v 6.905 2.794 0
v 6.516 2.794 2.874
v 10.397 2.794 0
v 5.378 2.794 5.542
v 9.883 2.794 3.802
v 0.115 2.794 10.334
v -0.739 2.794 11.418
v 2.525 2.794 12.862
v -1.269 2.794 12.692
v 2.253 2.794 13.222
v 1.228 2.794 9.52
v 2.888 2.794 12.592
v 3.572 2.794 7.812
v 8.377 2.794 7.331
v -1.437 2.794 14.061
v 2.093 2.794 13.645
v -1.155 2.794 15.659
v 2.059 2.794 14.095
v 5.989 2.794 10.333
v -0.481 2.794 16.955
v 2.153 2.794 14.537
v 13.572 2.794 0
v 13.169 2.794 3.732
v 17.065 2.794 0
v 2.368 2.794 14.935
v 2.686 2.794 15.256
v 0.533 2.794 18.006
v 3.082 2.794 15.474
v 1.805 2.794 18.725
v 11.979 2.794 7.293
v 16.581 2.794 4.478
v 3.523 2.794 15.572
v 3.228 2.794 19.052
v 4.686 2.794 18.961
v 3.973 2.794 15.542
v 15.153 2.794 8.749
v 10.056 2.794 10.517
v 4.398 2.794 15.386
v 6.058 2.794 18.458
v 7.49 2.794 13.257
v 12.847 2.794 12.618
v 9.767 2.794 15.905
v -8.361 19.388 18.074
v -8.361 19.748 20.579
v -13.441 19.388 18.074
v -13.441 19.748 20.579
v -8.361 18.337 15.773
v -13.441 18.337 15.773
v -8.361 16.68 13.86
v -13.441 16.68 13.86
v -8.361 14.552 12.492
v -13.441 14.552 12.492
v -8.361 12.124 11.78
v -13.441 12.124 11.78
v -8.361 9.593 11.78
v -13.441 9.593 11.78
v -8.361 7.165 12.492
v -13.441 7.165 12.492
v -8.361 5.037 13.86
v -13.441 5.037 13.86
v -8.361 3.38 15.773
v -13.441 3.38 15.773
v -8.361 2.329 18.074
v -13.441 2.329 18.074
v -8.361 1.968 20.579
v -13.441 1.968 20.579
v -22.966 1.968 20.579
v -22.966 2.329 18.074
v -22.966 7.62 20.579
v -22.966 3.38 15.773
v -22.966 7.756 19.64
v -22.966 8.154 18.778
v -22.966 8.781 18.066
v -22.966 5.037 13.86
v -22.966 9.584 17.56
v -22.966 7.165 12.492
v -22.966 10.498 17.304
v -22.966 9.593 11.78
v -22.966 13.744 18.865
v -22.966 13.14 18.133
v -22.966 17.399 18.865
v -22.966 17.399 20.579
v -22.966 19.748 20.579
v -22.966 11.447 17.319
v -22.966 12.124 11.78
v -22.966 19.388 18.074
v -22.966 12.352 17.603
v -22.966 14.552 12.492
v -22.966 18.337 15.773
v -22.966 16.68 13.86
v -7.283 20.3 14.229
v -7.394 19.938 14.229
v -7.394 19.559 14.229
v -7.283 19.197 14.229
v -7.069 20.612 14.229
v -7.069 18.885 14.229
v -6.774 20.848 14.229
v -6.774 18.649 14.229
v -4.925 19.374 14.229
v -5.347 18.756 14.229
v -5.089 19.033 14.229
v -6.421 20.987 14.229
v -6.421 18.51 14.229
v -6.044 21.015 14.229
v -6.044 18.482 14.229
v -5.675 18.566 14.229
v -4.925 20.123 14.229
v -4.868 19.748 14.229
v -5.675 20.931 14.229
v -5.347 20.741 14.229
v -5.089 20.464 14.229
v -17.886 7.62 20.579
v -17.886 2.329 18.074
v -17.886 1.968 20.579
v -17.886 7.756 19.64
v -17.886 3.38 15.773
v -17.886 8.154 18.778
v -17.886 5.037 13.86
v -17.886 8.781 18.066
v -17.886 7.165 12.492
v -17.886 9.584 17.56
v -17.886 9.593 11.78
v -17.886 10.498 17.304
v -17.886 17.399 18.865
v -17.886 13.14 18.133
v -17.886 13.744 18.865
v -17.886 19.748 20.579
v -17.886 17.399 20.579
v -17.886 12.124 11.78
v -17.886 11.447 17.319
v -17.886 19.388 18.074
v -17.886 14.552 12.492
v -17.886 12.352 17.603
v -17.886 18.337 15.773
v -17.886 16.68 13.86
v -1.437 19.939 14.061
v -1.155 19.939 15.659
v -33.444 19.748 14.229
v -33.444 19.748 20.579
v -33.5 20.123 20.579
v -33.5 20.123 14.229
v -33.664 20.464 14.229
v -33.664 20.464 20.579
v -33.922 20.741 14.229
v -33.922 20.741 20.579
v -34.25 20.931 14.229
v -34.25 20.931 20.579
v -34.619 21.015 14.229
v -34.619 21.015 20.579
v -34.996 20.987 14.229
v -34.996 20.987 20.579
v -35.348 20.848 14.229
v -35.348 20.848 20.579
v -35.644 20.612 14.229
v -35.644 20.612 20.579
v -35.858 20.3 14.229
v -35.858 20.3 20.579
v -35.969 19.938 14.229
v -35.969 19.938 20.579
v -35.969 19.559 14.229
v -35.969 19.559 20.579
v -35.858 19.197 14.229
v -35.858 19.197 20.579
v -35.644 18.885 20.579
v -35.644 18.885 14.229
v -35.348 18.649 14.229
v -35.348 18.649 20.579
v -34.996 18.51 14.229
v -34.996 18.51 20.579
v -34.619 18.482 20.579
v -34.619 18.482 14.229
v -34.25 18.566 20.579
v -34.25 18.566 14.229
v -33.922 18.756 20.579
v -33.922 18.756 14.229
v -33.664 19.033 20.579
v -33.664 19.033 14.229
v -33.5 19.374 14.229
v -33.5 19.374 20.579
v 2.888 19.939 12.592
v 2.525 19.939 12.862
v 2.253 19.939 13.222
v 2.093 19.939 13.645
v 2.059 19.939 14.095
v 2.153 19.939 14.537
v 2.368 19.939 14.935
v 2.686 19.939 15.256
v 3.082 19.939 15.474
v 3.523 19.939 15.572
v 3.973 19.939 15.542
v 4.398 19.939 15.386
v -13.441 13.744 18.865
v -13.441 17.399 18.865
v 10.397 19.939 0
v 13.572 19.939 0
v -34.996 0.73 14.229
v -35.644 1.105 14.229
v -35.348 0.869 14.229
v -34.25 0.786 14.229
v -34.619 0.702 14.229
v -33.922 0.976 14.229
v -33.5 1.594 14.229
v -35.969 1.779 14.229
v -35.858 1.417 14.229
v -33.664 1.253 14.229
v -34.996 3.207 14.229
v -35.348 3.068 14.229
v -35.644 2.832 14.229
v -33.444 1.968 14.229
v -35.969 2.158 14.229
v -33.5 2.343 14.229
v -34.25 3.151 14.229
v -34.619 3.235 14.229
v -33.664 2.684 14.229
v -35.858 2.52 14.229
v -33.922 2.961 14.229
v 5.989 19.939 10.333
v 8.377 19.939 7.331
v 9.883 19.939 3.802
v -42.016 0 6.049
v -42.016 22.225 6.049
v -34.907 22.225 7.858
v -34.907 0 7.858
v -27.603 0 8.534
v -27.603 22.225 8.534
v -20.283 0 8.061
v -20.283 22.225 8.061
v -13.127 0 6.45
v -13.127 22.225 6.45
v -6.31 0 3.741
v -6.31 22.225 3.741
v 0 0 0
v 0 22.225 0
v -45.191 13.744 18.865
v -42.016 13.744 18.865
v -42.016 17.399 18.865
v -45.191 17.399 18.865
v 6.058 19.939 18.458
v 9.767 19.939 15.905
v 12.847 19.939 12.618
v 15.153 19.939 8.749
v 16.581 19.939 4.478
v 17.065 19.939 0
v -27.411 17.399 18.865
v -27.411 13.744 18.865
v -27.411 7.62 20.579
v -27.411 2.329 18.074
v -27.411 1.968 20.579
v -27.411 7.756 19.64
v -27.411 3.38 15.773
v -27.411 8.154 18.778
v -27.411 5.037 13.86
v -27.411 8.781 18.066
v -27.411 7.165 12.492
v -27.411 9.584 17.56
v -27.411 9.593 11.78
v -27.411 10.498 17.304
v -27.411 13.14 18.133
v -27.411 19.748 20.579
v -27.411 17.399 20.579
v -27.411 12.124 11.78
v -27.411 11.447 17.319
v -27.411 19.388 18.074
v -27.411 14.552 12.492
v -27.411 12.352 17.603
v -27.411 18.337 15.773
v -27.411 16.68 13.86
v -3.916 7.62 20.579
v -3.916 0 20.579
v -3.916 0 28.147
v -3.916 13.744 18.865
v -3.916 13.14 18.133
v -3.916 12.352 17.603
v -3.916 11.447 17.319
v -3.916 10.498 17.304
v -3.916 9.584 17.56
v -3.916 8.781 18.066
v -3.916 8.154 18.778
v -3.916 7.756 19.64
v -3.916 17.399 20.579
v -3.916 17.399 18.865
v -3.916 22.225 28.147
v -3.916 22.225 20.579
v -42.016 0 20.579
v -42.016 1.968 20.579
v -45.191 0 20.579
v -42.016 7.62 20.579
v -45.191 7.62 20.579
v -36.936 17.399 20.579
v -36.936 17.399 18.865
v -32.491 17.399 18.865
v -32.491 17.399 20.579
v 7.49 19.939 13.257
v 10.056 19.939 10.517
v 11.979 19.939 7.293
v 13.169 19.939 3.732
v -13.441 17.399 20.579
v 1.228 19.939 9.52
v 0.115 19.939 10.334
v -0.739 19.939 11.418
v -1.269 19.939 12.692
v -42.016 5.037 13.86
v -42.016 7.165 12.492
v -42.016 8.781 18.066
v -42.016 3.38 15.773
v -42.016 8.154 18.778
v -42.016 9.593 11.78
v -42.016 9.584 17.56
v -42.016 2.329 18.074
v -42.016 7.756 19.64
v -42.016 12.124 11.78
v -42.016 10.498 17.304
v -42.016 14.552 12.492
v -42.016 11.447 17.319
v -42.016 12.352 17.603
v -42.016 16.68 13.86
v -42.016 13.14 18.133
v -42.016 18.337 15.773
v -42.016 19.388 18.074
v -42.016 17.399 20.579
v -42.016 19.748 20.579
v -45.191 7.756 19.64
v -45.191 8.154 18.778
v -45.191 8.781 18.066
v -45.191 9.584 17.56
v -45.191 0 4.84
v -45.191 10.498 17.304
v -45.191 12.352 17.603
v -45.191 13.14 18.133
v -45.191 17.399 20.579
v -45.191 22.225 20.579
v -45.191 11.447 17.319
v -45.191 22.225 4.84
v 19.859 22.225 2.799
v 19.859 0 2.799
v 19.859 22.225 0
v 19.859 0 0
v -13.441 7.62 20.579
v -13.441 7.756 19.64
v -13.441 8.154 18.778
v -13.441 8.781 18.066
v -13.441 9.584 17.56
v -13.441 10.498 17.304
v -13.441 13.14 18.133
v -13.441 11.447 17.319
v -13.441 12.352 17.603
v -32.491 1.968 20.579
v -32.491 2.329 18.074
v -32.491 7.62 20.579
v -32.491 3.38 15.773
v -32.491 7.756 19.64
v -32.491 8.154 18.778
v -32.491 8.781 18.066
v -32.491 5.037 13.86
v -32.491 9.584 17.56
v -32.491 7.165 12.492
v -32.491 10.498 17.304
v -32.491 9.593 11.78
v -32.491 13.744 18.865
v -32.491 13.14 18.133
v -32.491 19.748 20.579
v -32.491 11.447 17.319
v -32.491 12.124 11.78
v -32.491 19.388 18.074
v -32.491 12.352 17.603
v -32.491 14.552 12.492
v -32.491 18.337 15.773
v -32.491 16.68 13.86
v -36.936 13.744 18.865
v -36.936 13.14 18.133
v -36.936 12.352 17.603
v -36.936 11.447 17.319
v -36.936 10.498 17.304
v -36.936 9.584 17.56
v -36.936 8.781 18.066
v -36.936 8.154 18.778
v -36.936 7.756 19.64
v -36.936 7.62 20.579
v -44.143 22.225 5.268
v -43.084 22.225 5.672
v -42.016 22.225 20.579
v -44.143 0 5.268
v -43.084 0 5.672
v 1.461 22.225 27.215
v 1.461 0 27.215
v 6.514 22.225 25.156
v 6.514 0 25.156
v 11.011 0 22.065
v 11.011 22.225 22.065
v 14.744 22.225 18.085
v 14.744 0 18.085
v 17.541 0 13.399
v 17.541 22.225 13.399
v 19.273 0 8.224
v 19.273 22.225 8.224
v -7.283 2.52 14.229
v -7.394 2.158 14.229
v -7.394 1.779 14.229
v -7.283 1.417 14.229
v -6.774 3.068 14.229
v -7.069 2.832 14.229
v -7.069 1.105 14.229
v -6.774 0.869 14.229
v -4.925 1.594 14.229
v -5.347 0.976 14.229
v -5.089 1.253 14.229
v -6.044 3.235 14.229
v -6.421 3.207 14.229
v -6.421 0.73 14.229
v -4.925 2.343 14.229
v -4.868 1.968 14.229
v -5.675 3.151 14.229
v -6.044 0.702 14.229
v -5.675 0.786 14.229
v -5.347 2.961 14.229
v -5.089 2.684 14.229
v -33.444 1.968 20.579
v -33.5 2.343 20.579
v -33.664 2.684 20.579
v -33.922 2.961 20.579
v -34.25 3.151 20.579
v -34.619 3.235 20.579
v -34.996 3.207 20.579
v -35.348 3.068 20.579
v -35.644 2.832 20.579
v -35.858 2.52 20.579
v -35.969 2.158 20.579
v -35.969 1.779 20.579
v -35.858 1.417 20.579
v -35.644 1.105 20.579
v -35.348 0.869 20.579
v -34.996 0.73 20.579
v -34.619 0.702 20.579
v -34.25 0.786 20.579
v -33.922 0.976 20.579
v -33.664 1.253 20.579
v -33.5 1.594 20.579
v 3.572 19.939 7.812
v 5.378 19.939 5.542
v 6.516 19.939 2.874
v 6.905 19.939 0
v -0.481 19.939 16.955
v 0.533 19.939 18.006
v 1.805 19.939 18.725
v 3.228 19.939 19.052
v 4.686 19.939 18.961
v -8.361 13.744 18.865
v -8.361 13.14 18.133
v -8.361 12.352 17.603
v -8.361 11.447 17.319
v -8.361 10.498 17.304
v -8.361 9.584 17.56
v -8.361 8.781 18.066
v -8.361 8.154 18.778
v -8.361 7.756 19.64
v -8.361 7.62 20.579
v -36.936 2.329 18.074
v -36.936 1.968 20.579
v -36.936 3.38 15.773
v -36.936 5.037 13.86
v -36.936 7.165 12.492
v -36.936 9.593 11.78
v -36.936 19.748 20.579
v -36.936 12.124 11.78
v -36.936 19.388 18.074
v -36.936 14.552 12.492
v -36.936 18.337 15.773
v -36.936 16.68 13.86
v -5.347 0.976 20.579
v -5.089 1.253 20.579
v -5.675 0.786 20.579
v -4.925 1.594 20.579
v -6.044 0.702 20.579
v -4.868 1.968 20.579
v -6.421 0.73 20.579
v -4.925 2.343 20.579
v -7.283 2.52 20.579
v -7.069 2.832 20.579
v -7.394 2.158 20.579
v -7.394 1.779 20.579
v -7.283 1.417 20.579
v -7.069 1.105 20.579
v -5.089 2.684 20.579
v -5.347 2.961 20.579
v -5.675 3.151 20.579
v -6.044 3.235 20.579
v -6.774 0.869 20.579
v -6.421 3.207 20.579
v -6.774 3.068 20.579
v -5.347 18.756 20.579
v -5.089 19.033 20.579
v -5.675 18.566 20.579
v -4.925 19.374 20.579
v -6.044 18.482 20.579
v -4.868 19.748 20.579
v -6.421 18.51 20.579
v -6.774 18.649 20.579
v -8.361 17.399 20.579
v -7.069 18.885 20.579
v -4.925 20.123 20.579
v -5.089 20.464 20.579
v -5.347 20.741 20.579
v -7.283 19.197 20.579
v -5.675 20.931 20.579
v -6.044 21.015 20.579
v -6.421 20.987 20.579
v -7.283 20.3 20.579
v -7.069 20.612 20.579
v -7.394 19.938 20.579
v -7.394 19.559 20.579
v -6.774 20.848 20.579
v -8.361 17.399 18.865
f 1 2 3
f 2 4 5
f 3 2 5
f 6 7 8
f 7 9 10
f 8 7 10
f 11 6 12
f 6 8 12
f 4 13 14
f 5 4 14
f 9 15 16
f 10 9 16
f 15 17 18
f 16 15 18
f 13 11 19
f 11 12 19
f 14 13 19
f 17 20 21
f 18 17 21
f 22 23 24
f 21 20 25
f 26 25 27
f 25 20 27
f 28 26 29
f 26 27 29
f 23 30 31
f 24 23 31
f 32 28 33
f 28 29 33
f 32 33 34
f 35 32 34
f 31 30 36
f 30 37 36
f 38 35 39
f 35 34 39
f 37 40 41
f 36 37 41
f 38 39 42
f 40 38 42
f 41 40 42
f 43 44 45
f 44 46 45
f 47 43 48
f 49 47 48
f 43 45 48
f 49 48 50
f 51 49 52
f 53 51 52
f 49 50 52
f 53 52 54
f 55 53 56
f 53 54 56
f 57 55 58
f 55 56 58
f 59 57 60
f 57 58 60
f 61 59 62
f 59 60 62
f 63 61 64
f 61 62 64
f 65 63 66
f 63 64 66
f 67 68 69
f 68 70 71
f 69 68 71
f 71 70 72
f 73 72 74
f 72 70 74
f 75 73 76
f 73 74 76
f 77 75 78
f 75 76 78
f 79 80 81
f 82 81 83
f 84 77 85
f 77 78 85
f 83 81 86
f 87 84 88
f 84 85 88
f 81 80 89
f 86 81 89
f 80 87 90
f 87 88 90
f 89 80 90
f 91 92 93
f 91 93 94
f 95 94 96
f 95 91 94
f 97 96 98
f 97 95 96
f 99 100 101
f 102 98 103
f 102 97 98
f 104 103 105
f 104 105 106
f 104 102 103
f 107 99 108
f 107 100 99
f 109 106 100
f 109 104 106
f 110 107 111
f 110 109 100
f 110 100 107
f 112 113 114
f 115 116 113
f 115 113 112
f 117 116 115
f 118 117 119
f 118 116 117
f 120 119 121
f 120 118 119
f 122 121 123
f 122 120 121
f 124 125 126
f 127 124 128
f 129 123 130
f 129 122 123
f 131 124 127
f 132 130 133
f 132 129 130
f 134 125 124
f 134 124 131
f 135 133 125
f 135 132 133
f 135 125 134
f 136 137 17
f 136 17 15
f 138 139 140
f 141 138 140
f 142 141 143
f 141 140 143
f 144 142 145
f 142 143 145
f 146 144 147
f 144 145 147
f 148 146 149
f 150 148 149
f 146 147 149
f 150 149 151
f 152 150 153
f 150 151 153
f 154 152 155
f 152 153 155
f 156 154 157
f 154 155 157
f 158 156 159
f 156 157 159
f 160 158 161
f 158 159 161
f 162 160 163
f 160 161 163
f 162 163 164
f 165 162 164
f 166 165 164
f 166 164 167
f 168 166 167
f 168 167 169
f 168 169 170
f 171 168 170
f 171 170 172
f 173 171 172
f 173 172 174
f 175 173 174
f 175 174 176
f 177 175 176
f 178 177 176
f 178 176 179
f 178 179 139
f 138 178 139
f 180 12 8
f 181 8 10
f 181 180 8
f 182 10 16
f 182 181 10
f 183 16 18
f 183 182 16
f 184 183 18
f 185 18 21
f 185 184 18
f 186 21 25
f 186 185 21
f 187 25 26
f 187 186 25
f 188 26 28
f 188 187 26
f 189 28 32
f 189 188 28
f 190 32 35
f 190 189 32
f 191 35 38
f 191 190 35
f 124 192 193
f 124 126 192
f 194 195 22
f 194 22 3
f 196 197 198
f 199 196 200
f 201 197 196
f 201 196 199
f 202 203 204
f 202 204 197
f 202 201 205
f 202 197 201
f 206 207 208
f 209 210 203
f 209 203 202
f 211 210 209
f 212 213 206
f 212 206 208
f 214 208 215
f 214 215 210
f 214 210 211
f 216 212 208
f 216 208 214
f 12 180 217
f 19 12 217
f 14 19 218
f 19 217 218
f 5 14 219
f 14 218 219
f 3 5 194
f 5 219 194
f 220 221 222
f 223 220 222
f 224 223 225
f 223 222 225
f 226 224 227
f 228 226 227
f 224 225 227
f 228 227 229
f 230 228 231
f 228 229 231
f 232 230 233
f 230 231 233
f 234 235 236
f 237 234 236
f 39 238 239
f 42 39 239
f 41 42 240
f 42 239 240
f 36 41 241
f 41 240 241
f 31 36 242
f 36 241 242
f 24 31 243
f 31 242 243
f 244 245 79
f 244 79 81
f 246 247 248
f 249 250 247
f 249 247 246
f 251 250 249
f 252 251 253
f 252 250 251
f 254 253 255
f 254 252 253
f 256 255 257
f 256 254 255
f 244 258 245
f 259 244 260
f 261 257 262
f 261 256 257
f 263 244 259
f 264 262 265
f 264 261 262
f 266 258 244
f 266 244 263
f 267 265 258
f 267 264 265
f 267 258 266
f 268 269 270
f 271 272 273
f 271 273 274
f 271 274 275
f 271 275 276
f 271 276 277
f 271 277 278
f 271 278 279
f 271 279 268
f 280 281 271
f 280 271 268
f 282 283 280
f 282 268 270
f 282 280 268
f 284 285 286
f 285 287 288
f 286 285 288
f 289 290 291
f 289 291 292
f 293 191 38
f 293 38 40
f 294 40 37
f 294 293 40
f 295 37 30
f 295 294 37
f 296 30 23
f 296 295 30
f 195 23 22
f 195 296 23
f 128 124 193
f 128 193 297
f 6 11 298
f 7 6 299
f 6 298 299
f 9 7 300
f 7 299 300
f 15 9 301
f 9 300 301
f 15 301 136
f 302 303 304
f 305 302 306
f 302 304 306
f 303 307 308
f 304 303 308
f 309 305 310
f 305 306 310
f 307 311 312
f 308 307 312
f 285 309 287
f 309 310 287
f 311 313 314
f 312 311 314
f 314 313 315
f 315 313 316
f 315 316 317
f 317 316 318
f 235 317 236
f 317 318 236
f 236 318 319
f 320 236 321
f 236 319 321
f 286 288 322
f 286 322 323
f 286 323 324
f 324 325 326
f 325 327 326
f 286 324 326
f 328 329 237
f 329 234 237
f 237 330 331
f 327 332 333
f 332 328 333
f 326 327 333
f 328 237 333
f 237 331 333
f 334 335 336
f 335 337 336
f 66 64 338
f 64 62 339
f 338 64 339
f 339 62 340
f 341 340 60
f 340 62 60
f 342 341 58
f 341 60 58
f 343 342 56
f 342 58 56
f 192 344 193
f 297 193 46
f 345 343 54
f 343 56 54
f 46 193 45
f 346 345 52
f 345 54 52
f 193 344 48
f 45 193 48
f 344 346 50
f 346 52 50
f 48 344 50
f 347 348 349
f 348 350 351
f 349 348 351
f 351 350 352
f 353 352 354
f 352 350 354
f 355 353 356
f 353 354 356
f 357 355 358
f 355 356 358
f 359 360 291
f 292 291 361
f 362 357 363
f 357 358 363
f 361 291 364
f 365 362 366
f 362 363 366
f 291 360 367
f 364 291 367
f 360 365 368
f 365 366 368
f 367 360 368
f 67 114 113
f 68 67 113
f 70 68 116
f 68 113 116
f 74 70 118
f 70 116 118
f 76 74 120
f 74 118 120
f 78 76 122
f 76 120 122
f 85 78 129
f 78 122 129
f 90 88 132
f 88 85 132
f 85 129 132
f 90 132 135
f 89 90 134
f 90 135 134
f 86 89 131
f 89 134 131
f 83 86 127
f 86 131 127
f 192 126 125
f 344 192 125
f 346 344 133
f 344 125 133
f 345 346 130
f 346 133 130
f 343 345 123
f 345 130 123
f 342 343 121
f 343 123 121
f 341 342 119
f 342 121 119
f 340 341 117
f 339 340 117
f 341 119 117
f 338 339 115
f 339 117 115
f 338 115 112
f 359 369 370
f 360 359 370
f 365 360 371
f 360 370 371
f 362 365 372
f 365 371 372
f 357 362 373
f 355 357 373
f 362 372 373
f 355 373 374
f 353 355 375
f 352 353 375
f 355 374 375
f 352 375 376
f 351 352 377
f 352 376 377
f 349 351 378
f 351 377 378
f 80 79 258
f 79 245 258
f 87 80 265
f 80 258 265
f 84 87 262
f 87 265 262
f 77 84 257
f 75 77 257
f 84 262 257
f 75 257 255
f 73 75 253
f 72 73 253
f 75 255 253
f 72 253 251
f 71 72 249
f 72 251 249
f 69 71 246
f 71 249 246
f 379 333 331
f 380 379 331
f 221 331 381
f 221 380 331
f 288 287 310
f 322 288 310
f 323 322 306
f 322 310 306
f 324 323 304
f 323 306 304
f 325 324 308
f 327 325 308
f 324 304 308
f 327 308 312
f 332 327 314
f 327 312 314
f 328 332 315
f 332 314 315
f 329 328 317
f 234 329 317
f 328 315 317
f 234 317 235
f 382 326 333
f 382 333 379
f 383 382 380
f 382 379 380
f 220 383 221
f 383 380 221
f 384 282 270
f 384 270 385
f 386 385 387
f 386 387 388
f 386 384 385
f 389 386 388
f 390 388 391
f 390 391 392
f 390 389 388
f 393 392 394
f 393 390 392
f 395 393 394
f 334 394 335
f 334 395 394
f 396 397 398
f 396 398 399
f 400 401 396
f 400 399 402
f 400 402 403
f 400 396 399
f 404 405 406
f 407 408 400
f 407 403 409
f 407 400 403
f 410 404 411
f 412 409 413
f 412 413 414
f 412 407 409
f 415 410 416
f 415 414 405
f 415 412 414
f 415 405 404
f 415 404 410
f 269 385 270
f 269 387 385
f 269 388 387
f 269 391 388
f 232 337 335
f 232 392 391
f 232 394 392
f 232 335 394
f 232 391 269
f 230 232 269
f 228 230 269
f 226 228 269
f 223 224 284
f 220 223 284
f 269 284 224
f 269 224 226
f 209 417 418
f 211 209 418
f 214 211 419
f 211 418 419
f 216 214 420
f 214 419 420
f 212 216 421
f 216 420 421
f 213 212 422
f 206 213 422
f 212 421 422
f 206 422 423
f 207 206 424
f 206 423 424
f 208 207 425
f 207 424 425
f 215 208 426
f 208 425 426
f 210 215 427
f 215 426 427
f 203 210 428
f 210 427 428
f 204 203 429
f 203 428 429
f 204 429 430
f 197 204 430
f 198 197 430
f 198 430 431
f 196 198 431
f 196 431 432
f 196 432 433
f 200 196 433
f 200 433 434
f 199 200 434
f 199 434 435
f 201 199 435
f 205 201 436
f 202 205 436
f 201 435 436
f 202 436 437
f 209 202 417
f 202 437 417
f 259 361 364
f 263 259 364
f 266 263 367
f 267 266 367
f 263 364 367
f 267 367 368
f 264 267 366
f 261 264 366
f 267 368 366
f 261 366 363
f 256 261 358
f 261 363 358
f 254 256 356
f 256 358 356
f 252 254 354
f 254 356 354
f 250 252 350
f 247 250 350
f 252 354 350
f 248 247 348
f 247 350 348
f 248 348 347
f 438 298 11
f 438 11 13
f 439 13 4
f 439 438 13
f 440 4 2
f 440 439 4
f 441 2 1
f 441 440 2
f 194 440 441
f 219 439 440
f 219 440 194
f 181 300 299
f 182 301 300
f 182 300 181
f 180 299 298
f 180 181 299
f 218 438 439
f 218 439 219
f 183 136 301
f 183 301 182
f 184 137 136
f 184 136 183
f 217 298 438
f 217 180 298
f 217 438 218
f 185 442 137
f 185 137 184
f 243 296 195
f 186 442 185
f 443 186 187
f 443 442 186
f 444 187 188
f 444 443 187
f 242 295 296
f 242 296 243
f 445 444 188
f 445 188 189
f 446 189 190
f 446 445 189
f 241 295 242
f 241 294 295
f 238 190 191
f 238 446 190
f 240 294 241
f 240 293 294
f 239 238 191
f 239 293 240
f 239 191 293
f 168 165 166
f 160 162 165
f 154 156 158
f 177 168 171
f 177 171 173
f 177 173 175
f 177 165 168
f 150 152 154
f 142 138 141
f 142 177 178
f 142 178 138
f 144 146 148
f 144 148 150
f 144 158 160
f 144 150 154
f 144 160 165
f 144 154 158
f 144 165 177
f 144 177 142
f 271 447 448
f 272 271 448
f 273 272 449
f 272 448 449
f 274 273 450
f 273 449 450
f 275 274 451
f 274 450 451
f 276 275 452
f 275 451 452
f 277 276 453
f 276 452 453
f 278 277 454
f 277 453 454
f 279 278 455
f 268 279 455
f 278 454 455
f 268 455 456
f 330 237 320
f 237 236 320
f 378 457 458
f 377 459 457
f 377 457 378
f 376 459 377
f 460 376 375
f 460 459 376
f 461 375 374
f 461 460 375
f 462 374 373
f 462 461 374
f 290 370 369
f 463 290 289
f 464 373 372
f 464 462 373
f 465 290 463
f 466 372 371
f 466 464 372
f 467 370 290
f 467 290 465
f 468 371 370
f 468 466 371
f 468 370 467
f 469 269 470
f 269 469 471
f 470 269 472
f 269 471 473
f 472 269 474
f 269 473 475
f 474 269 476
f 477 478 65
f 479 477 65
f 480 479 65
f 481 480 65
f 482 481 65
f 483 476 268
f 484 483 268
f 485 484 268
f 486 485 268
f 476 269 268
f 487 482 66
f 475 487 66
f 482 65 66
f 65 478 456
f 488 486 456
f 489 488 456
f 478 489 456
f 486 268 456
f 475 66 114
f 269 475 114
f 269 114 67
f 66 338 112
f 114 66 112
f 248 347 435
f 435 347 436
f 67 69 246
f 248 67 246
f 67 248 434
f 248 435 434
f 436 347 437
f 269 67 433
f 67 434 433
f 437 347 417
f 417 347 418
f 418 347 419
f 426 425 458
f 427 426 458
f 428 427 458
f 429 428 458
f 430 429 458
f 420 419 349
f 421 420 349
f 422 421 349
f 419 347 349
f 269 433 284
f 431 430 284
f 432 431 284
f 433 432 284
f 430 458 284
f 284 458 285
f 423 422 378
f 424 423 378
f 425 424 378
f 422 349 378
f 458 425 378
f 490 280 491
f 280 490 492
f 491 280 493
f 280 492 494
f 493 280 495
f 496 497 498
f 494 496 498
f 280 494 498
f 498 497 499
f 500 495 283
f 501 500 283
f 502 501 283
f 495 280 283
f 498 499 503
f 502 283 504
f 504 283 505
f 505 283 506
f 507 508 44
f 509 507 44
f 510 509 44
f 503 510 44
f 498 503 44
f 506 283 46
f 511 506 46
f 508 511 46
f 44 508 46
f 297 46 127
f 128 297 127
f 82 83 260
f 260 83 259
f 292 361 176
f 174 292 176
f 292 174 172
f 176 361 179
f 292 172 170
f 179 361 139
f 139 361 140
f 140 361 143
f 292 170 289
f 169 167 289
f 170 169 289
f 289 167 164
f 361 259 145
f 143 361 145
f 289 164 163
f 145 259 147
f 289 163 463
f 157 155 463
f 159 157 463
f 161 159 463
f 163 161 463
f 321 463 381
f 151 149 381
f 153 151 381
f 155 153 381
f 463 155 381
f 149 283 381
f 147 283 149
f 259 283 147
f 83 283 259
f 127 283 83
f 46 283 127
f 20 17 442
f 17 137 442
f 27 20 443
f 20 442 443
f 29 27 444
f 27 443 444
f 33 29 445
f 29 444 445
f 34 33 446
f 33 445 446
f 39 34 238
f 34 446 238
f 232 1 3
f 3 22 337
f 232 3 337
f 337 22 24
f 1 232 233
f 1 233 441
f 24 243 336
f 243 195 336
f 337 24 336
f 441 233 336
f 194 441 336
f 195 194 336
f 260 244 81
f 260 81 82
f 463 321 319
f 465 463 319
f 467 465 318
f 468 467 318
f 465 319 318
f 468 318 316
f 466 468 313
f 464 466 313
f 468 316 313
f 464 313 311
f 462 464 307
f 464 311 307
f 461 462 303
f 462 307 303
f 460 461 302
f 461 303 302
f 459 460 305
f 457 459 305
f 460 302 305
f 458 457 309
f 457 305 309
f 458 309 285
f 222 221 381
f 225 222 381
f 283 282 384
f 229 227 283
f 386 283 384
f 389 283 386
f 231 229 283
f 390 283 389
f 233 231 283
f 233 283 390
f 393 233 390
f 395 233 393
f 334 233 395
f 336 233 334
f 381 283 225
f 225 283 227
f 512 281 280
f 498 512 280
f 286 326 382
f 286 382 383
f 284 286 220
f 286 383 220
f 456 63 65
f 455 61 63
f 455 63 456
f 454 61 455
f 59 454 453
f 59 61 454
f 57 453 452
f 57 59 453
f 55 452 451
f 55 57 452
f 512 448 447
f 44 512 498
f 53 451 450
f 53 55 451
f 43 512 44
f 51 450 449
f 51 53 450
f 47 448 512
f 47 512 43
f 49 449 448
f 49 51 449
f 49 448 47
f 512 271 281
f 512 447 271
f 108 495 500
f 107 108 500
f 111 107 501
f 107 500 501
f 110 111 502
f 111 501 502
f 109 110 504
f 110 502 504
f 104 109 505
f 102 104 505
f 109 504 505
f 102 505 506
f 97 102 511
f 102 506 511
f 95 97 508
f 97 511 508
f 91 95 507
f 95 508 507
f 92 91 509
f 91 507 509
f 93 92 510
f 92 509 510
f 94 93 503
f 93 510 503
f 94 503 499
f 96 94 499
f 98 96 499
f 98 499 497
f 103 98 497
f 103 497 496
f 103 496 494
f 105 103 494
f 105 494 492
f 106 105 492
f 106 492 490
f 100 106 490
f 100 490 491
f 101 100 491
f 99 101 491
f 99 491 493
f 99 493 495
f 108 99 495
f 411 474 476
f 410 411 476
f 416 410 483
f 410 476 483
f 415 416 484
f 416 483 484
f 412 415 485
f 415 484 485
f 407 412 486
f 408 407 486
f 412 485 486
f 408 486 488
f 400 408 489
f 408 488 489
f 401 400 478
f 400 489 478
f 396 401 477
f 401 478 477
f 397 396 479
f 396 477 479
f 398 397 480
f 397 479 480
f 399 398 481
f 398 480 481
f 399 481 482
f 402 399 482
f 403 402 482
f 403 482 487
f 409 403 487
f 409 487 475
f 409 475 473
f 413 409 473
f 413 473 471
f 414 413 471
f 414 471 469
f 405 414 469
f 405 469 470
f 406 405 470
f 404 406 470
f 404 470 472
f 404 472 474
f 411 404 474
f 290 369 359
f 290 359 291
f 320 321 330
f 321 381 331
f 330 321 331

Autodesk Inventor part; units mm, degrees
ref_plane "YZ Plane" through (0, 0, 0) normal (1, 0, 0) x (0, 1, 0)
ref_plane "XZ Plane" through (0, 0, 0) normal (0, 1, 0) x (-1, 0, 0)
sketch "Sketch1" plane through (0, 0, 0) normal (0, 0, 1) x (1, 0, 0)
  circle A0 centre (12.2387, 16.51) radius 2.54 projected
  line L0 (19.8587, 0) -> (0, 0) projected
  line L1 (19.8587, 0) -> (19.8587, 22.225) projected
  line L2 (0, 22.225) -> (19.8587, 22.225) projected
  line L3 (0, 0) -> (0, 22.225) projected
  line L4 (-42.016, 22.225) -> (-42.016, 0) projected
  line L5 (-42.016, 22.225) -> (19.8587, 22.225)
  line L6 (19.8587, 22.225) -> (19.8587, 0)
  line L7 (19.8587, 0) -> (-42.016, 0)
  line L8 (-42.016, 0) -> (-42.016, 22.225)
ref_plane "Work Plane1" through (-48.366, 22.225, 28.1991) normal (0, 0, 1) x (1, 0, 0)
extrude "Extrusion1" add sketch "Sketch1" along normal up to surface (28.1991 mm away) contours A0 | L0 L3 L2 L1 | L7 L4 L5 L3
sketch "Sketch6" plane through (-42.016, 22.225, 0) normal (0, 1, 0) x (1, 0, 0)
  arc A0 (36.4747, -28.1991) -> (61.8747, -2.7991) centre (36.4747, -2.7991) ccw projected
  arc A1 (-11.8913, 0) -> (42.016, 0) centre (15.0623, 38.2739) ccw projected
  line L0 (0, -17.4041) -> (38.1, -17.4041)
  line L1 (0, 0) -> (0, -28.1991) projected
  line L2 (0, -6.049) -> (0, 0)
  line L3 (0, 0) -> (42.016, 0)
  line L4 (61.8747, 0) -> (61.8747, -28.1991) projected
  line L5 (61.8747, -2.7991) -> (61.8747, -28.1991)
  line L6 (61.8747, -28.1991) -> (36.4747, -28.1991)
  line L7 (38.1, -17.4041) -> (38.1, -28.147)
  line L8 (0, -17.4041) -> (0, -6.049)
  line L9 (61.8747, -28.1991) -> (0, -28.1991) projected
  line L10 (38.1, -28.1991) -> (36.4747, -28.1991)
  line L11 (38.1, -17.4041) -> (0, -17.4041)
  line L12 (0, -17.4041) -> (0, -28.1991)
  line L13 (0, -28.1991) -> (38.1, -28.1991)
  line L14 (38.1, -28.1991) -> (38.1, -17.4041)
  line L15 (0, -23.7541) -> (38.1, -23.7541)
  line L16 (0, -28.1991) -> (38.9215, -28.2018)
  line L17 (38.9215, -28.2018) -> (38.9212, -28.1991)
  line L18 (36.4747, -20.5791) -> (38.1, -20.5791)
  line L19 (36.4747, -20.5791) -> (0, -20.5791)
extrude "Extrusion6" cut sketch "Sketch6" against normal through all contours L9 L1 L15 L7 A0 | A0 L14 L6 | L6 L17 L16 L9 | L1 L3 A1 | A0 L4 L6 L14 | L15 L1 L19 L18 L7
sketch "Sketch7" plane through (-42.016, 0, 6.049) normal (-1, 0, 0) x (0, 0, 1)
  line L0 (16.1176, 18.669) -> (12.9426, 18.669) projected
  circle A0 centre (14.5301, 10.922) radius 3.175 projected
  arc A1 (12.8156, 13.744) -> (16.2446, 13.744) centre (14.5301, 10.922) ccw
  line L1 (16.2446, 18.796) -> (16.2446, 10.795)
  line L2 (16.2446, 10.795) -> (12.8156, 10.795)
  line L3 (12.8156, 10.795) -> (12.8156, 18.796)
  line L4 (12.8156, 17.399) -> (16.2446, 17.399)
  point P0 (-6.049, 0)
  dimension "d31" = 6.604
  dimension "d35" = 6.477
extrude "Extrusion7" cut sketch "Sketch7" against normal blind 38.1
sketch "Sketch8" plane through (-42.016, 0, 20.5791) normal (0, 0, 1) x (1, 0, 0)
  line L0 (0, 14.097) -> (33.655, 14.097)
  line L1 (38.1, 7.62) -> (0, 7.62) projected
  line L2 (0, 14.097) -> (0, 7.62)
  line L3 (0, 13.744) -> (38.1, 13.744) projected
  line L4 (0, 22.225) -> (0, 0) projected
  line L5 (38.1, 10.8585) -> (0, 10.8585)
  line L6 (9.525, 13.6716) -> (5.08, 13.6716) projected
  line L7 (9.525, 13.6716) -> (9.525, 17.272) projected
  line L8 (9.525, 17.272) -> (5.08, 17.272) projected
  line L9 (5.08, 17.272) -> (5.08, 13.6716) projected
  line L10 (19.05, 13.6716) -> (14.605, 13.6716) projected
  line L11 (19.05, 13.6716) -> (19.05, 17.272) projected
  line L12 (19.05, 17.272) -> (14.605, 17.272) projected
  line L13 (14.605, 17.272) -> (14.605, 13.6716) projected
  line L14 (28.575, 13.6716) -> (24.13, 13.6716) projected
  line L15 (28.575, 13.6716) -> (28.575, 17.272) projected
  line L16 (28.575, 17.272) -> (24.13, 17.272) projected
  line L17 (24.13, 17.272) -> (24.13, 13.6716) projected
  line L18 (38.1, 13.6716) -> (33.655, 13.6716) projected
  line L19 (38.1, 13.6716) -> (38.1, 17.272) projected
  line L20 (38.1, 17.272) -> (33.655, 17.272) projected
  line L21 (33.655, 17.272) -> (33.655, 13.6716) projected
  line L22 (0, 10.8585) -> (5.08, 10.8585)
  line L23 (5.08, 10.8585) -> (5.08, 19.7485)
  line L24 (5.08, 19.7485) -> (0, 19.7485)
  line L25 (0, 19.7485) -> (0, 10.8585)
  line L26 (9.525, 10.8585) -> (14.605, 10.8585)
  line L27 (14.605, 10.8585) -> (14.605, 19.7485)
  line L28 (14.605, 19.7485) -> (9.525, 19.7485)
  line L29 (9.525, 19.7485) -> (9.525, 10.8585)
  line L30 (19.05, 19.7485) -> (24.13, 19.7485)
  line L31 (24.13, 19.7485) -> (24.13, 10.8585)
  line L32 (24.13, 10.8585) -> (19.05, 10.8585)
  line L33 (19.05, 10.8585) -> (19.05, 19.7485)
  line L34 (28.575, 10.8585) -> (33.655, 10.8585)
  line L35 (33.655, 10.8585) -> (33.655, 19.7485)
  line L36 (33.655, 19.7485) -> (28.575, 19.7485)
  line L37 (28.575, 19.7485) -> (28.575, 10.8585)
  point P0 (42.016, 0)
  dimension "d36" = 8.89
revolve "Revolution2" cut sketch "Sketch8" angle 360 about axis through (-3.916, 10.8585, 20.5791) along (-1, 0, 0) contours L4 L24 L23 L9 L0 | L0 L9 L3 L2 | L3 L9 L23 L5 L2 | L7 L29 L28 L27 L13 L0 | L0 L13 L3 L7 | L3 L13 L27 L5 L29 L7 | L11 L33 L30 L31 L17 L0 | L0 L17 L3 L11 | L3 L17 L31 L5 L33 L11 | L15 L37 L36 L35 L21 L0 | L0 L21 L3 L15 | L3 L21 L35 L5 L37 L15
sketch "Sketch9" plane through (-42.016, 22.225, 20.5791) normal (0, 0, 1) x (1, 0, 0)
  line L0 (19.05, -4.826) -> (19.05, -2.4765) projected
  line L1 (19.05, -2.4765) -> (24.13, -2.4765) projected
  line L2 (24.13, -2.4765) -> (24.13, -4.826) projected
  line L3 (24.13, -4.826) -> (28.575, -4.826) projected
  line L4 (28.575, -4.826) -> (28.575, -2.4765) projected
  line L5 (28.575, -2.4765) -> (33.655, -2.4765) projected
  line L6 (33.655, -2.4765) -> (33.655, -4.826) projected
  line L7 (33.655, -4.826) -> (38.1, -4.826) projected
  line L8 (38.1, 0) -> (38.1, -4.826) projected
  line L9 (0, 0) -> (38.1, 0) projected
  line L10 (0, -2.4765) -> (0, 0) projected
  line L11 (0, -2.4765) -> (5.08, -2.4765) projected
  line L12 (5.08, -2.4765) -> (5.08, -4.826) projected
  line L13 (5.08, -4.826) -> (9.525, -4.826) projected
  line L14 (9.525, -4.826) -> (9.525, -2.4765) projected
  line L15 (9.525, -2.4765) -> (14.605, -2.4765) projected
  line L16 (14.605, -2.4765) -> (14.605, -4.826) projected
  line L17 (14.605, -4.826) -> (19.05, -4.826) projected
  circle A0 centre (7.3025, -2.4765) radius 1.27
  line L18 (19.05, -20.2565) -> (19.05, -14.605) projected
  line L19 (19.05, -14.605) -> (14.605, -14.605) projected
  line L20 (14.605, -14.605) -> (14.605, -20.2565) projected
  line L21 (14.605, -20.2565) -> (9.525, -20.2565) projected
  line L22 (9.525, -20.2565) -> (9.525, -14.605) projected
  line L23 (9.525, -14.605) -> (5.08, -14.605) projected
  line L24 (5.08, -14.605) -> (5.08, -20.2565) projected
  line L25 (5.08, -20.2565) -> (0, -20.2565) projected
  line L26 (0, -22.225) -> (0, -20.2565) projected
  line L27 (38.1, -22.225) -> (0, -22.225) projected
  line L28 (38.1, -14.605) -> (38.1, -22.225) projected
  line L29 (38.1, -14.605) -> (33.655, -14.605) projected
  line L30 (33.655, -14.605) -> (33.655, -20.2565) projected
  line L31 (33.655, -20.2565) -> (28.575, -20.2565) projected
  line L32 (28.575, -20.2565) -> (28.575, -14.605) projected
  line L33 (28.575, -14.605) -> (24.13, -14.605) projected
  line L34 (24.13, -14.605) -> (24.13, -20.2565) projected
  line L35 (24.13, -20.2565) -> (19.05, -20.2565) projected
  circle A1 centre (35.8775, -20.2565) radius 1.27
  circle A2 centre (35.8775, -2.4765) radius 1.27
  circle A3 centre (7.3025, -20.2565) radius 1.27
  point P0 (42.016, -22.225)
  dimension "d38" = 2.54
  dimension "d39" = 2.54
  dimension "d40" = 2.54
  dimension "d41" = 2.54
extrude "Extrusion8" cut sketch "Sketch9" against normal blind 6.35 contours A0 | A1 | A2 | A3
sketch "Sketch10" plane through (0, 22.225, 0) normal (0, 1, 0) x (1, 0, 0)
  arc A0 (-42.016, -6.049) -> (0, 0) centre (-26.9537, 38.2739) ccw projected
  line L0 (-42.016, -6.049) -> (-42.016, -20.5791) projected
  line L1 (-42.016, -20.5791) -> (-3.916, -20.5791) projected
  line L2 (-3.916, -20.5791) -> (-3.916, -28.147) projected
  arc A1 (-3.916, -28.147) -> (19.8587, -2.7991) centre (-5.5413, -2.7991) ccw projected
  line L3 (19.8587, 0) -> (19.8587, -2.7991) projected
  line L4 (19.8587, 0) -> (0, 0) projected
  line L5 (0, 0) -> (19.8587, 0) projected
  arc A2 (-45.191, -4.8398) -> (0, 0) centre (-26.9537, 38.2739) ccw
  line L6 (-42.016, -20.5791) -> (-45.191, -20.5791)
  line L7 (-45.191, -20.5791) -> (-45.191, -4.8398)
  line L8 (-42.016, -6.049) -> (-42.016, -20.5791)
extrude "Extrusion9" add sketch "Sketch10" against normal up to surface (22.225 mm away) contours L0 L6 L7 A2
sketch "Sketch11" plane through (-36.936, 1.9685, 20.5791) normal (-1, 0, 0) x (0, 0, 1)
  line L0 (-1.7145, 15.4305) -> (0, 15.4305) projected
  line L1 (0, 19.05) -> (0, 16.51) projected
  line L2 (0, 20.2565) -> (0, 15.4305) projected
  line L3 (7.5679, 20.2565) -> (-17.78, 20.2565) projected
  line L4 (-1.7145, 11.7755) -> (-1.7145, 15.4305) projected
  arc A0 (-1.7145, 11.7755) -> (0, 5.6515) centre (0, 8.9535) ccw projected
  line L5 (0, 0) -> (0, 5.6515) projected
  line L6 (0, 1.27) -> (0, -1.27) projected
  line L7 (0, 5.6515) -> (0, -1.9685) projected
  arc A1 (0, 17.78) -> (0, 0) centre (0, 8.89) ccw projected
  line L8 (-1.7145, 15.4305) -> (0, 15.4305) projected
  line L9 (0, 15.4305) -> (0, 5.6515)
  point P0 (-20.5791, -1.9685)
extrude "Extrusion10" cut sketch "Sketch11" along normal through all contours L0 L9 A0 L4
sketch "Sketch12" plane through (0, 0, 0) normal (0, 0, -1) x (-1, 0, 0)
  circle A0 centre (-12.2387, 16.51) radius 2.54
  circle A1 centre (-12.2387, 16.51) radius 2.54
  line L0 (0.9001, 2.794) -> (-17.0647, 2.794)
  line L1 (0.9001, 2.794) -> (0.9001, 22.225)
  line L2 (-17.0647, 22.225) -> (0.9001, 22.225)
  line L3 (-17.0647, 2.794) -> (-17.0647, 22.225)
  line L4 (60.812, 2.794) -> (60.812, 18.669)
  line L5 (60.812, 18.669) -> (51.9355, 18.669)
  line L6 (51.9355, 18.669) -> (51.9355, 2.794)
  line L7 (70.972, 2.794) -> (60.812, 2.794)
  line L8 (-17.0647, 2.794) -> (-6.9047, 2.794)
  line L9 (-6.9047, 2.794) -> (-6.9047, 19.939)
  line L10 (-6.9047, 19.939) -> (-17.0647, 19.939)
  line L11 (-17.0647, 19.939) -> (-17.0647, 2.794)
  line L12 (3.916, 0) -> (3.916, 22.225)
  point P0 (0, 0)
revolve "Revolution3" cut sketch "Sketch12" angle 80 about axis through (-3.916, 0, 0) along (0, -1, 0) contours A0 | L0 L3 L10 L9
sketch "Sketch13" plane through (6.9047, 19.939, 0) normal (0, -1, 0) x (1, 0, 0)
  arc A0 (10.16, 0) -> (-7.1774, 20.6619) centre (-10.8207, 0) ccw projected
  line L0 (-8.9417, 10.6563) -> (-7.1774, 20.6619) projected
  arc A1 (0, 0) -> (-8.9417, 10.6563) centre (-10.8207, 0) ccw projected
  arc A2 (-2.5072, 15.3858) -> (-4.0166, 12.5925) centre (-3.2619, 13.9892) ccw
  arc A3 (-5.6768, 9.5199) -> (-8.9417, 10.6563) centre (-10.8207, 0) ccw
  arc A4 (-0.847, 18.4585) -> (-7.1774, 20.6619) centre (-10.8207, 0) ccw
  line L1 (-7.1774, 20.6619) -> (-8.9417, 10.6563)
  arc A5 (-0.847, 18.4585) -> (-8.0596, 15.6591) centre (-3.2619, 13.9892) ccw
  arc A6 (-8.3414, 14.0608) -> (-5.6768, 9.5199) centre (-3.2619, 13.9892) ccw
  arc A7 (-0.847, 18.4585) -> (-8.0596, 15.6591) centre (-3.2619, 13.9892) ccw
  arc A8 (-8.3414, 14.0608) -> (-5.6768, 9.5199) centre (-3.2619, 13.9892) ccw
  arc A9 (6.6675, 0) -> (-2.5072, 15.3858) centre (-10.8207, 0) ccw
  arc A10 (3.4925, 0) -> (-4.0166, 12.5925) centre (-10.8207, 0) ccw
  line L2 (6.6675, 0) -> (3.4925, 0)
  line L3 (-6.9047, 0) -> (12.954, 0) projected
  dimension "d52" = 3.175
extrude "Extrusion11" add sketch "Sketch13" along normal up to next contours A5 L0 A0 | L2 A10 A2 A9 | A6 A1 L0
chamfer "Chamfer1" [suppressed]
fillet "Fillet1" [suppressed]
fillet "Fillet2" [suppressed]
properties part number "final lock housing back"
